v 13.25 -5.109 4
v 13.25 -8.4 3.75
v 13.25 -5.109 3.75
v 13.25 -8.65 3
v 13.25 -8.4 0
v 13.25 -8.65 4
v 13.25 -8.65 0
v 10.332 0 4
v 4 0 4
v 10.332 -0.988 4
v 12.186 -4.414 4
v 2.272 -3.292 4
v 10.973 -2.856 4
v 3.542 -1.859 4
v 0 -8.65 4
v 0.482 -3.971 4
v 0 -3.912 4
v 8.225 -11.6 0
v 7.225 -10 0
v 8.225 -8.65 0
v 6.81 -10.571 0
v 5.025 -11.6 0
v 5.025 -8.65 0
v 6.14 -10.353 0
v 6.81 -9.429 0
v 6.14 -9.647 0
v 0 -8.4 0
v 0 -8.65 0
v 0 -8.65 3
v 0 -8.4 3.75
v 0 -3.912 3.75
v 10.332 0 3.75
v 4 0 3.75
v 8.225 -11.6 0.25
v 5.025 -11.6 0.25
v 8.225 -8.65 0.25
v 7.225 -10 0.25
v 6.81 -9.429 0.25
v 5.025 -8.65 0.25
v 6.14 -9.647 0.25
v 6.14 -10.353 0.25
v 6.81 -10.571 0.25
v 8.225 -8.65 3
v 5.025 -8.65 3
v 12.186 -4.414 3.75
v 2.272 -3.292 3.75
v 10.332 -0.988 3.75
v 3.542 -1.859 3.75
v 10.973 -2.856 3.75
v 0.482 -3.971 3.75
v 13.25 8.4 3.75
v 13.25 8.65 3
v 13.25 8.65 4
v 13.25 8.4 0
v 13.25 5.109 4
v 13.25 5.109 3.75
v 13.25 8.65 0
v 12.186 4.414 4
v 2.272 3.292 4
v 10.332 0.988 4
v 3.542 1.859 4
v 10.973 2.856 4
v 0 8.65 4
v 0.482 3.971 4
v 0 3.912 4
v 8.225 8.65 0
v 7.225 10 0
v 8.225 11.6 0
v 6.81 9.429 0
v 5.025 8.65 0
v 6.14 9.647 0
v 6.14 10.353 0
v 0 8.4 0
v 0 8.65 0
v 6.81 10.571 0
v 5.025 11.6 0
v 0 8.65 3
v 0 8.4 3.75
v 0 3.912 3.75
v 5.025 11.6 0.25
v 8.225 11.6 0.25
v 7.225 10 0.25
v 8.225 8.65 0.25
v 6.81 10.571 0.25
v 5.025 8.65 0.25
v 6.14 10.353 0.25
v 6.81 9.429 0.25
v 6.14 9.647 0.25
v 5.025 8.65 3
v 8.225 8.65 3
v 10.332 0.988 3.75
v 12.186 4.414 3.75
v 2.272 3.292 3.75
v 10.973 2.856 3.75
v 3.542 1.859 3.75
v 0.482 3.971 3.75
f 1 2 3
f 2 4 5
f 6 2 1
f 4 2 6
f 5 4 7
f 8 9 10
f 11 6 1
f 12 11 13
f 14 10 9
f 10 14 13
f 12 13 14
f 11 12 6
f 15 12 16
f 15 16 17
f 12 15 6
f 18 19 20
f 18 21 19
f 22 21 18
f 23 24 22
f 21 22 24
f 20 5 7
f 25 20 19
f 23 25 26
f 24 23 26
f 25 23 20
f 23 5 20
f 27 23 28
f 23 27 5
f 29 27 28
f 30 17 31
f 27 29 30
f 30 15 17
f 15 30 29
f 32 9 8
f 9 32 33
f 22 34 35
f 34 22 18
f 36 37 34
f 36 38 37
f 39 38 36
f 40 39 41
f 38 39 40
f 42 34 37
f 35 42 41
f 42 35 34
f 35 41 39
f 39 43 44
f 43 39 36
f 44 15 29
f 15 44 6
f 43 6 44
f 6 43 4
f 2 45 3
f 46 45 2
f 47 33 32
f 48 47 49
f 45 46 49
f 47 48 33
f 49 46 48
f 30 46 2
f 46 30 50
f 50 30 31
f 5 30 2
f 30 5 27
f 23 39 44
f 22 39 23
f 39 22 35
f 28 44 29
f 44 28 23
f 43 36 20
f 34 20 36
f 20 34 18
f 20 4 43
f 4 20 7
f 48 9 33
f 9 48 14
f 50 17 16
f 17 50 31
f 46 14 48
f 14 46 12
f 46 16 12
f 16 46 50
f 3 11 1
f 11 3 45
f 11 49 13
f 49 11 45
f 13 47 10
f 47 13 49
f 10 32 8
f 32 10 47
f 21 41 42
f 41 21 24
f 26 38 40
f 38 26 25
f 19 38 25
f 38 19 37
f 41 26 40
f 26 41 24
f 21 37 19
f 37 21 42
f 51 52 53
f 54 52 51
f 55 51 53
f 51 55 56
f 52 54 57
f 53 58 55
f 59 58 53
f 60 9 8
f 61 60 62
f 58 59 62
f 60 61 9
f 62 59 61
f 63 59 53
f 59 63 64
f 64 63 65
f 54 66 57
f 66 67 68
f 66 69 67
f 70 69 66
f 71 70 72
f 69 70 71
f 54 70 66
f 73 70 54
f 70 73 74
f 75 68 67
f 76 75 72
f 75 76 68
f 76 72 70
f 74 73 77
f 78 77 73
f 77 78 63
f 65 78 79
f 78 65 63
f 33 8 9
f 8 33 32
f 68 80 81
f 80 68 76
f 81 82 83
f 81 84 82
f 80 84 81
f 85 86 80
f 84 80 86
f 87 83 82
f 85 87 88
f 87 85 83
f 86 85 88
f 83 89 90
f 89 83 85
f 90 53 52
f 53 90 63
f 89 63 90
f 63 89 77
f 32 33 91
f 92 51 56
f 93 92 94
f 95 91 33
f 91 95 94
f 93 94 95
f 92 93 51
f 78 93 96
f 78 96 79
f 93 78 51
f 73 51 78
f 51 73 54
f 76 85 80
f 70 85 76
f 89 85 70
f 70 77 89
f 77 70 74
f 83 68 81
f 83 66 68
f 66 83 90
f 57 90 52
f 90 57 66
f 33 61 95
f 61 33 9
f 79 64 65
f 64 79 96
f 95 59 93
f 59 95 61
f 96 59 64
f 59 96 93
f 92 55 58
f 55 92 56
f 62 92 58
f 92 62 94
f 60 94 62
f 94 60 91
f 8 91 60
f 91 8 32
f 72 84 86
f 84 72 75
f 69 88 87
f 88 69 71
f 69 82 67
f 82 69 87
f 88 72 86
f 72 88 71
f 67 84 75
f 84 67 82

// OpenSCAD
module half(){
    difference(){
        difference(){
            difference(){
                difference(){
                    difference(){
                        difference(){
                            translate([0, -23.2/2, 0])
                                difference(){
                                    cube([13.25,23.2/2,4]);
                                    translate([-1,-1,0.25])
                                        cube([13.25 + 2,2.95 + 1,4]);
                                };
                            translate([-1, -23.2/2 + 2.95 + 0.25, -0.25])
                                cube([13.25+2, 23.2/2, 4]);
                        }
                        translate([-1, -23.2/2-1,-1])
                            cube([ (13.25-3.2)/2+1, 2.95+1,4]);
                    }
                    translate([(13.25+3.2)/2, -23.2/2-1,-1])
                        cube([ (13.25-3.2)/2+1, 2.95+1,4]);
                }
                cylinder(6,4,4);
            }
            translate([13.25+3,0,0])
                cylinder(6,6,6);
        }
        translate([13.25/2,-23.2/2+3.2/2,-1])
            cylinder(4,0.6,0.6);
    }
}

half();
mirror([0,1,0]) half();
